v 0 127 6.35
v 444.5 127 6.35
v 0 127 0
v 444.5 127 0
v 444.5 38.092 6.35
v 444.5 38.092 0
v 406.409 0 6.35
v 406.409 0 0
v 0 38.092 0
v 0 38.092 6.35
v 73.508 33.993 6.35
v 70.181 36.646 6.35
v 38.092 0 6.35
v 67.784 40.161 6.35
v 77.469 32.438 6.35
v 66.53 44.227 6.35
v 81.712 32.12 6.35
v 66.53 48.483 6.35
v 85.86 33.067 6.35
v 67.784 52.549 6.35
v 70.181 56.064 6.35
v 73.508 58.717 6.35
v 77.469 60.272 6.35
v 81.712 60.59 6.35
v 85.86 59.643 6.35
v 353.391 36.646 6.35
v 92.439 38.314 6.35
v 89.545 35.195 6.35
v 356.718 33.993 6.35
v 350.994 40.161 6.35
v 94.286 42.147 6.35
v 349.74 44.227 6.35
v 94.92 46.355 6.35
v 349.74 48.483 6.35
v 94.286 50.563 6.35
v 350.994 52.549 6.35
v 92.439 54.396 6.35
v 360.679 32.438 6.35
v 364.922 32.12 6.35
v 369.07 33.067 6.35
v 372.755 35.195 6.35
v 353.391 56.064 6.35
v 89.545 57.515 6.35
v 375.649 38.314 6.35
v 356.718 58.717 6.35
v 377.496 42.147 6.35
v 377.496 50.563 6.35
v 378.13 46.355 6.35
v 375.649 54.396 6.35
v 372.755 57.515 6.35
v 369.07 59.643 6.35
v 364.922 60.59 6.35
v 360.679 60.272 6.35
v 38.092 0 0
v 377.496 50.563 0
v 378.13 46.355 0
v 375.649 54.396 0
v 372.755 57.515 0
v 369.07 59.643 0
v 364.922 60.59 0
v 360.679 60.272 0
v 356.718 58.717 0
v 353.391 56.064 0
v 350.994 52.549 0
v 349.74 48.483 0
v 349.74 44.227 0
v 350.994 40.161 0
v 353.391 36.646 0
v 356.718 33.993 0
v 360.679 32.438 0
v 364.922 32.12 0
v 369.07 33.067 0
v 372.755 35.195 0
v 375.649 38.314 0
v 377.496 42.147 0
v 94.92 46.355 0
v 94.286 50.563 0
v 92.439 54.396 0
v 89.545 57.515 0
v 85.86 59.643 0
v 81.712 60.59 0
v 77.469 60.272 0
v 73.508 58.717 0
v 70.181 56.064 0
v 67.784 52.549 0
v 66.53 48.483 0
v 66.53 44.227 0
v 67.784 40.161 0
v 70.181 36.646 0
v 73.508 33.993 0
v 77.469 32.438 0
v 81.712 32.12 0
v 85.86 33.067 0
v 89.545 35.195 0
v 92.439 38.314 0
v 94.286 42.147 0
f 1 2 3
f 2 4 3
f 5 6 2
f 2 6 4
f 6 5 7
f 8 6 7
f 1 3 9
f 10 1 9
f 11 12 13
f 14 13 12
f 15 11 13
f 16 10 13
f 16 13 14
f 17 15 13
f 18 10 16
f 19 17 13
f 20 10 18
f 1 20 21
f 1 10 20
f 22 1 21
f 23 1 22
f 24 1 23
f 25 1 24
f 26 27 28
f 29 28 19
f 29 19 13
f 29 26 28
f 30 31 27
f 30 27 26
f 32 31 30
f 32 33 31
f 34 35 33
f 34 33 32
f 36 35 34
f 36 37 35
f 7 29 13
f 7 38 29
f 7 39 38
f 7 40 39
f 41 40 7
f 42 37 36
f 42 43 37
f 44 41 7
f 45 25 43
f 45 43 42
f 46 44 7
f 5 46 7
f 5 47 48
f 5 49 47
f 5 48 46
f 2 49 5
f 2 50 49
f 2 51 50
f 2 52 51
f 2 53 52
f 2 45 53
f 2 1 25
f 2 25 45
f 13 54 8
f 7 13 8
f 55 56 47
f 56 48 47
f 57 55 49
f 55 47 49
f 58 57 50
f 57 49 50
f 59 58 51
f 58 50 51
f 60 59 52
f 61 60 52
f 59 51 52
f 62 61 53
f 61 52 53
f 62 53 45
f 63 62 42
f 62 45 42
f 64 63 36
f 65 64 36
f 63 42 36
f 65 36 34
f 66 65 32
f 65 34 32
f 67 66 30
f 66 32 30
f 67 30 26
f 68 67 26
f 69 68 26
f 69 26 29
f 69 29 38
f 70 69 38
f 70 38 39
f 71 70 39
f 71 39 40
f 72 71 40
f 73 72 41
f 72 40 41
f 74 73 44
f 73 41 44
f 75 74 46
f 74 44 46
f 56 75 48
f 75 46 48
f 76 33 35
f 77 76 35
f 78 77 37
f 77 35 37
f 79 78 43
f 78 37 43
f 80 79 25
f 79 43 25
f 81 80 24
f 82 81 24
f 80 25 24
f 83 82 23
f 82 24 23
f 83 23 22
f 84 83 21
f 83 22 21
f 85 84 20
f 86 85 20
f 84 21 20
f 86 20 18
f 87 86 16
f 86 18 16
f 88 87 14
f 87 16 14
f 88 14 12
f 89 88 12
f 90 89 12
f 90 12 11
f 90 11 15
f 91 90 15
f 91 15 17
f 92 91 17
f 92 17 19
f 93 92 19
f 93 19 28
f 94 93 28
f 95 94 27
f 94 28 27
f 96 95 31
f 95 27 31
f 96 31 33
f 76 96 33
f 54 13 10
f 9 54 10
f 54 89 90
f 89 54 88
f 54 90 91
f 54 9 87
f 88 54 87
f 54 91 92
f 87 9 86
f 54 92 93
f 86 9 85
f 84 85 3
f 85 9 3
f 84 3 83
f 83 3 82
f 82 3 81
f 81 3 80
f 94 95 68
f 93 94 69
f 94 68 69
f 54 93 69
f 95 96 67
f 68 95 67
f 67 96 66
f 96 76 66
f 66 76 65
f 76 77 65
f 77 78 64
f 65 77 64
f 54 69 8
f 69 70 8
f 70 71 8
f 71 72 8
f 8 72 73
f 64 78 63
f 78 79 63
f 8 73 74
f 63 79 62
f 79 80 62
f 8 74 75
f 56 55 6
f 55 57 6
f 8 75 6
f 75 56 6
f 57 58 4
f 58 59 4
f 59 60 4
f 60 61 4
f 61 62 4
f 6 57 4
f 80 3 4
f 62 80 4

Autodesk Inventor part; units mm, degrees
ref_plane "YZ Plane" through (0, 0, 0) normal (1, 0, 0) x (0, 1, 0)
ref_plane "XZ Plane" through (0, 0, 0) normal (0, 1, 0) x (-1, 0, 0)
ref_plane "XY Plane" through (0, 0, 0) normal (0, 0, 1) x (1, 0, 0)
sketch "Sketch1" plane through (0, 0, 0) normal (0, 0, 1) x (1, 0, 0)
  line L0 (0, 0) -> (444.5, 0)
  line L1 (444.5, 0) -> (444.5, 127)
  line L2 (444.5, 127) -> (0, 127)
  line L3 (0, 127) -> (0, 0)
  dimension "d0" = 444.5
  dimension "d1" = 127
extrude "Extrusion1" add sketch "Sketch1" along normal blind 6.35
sketch "Sketch2" plane through (0, 0, 6.35) normal (0, 0, 1) x (1, 0, 0)
  line L0 (0, 0) -> (444.5, 0) projected
  line L1 (38.0923, 0) -> (0, 38.0919)
  line L2 (0, 127) -> (0, 0) projected
  line L3 (0, 0) -> (444.5, 0) projected
  line L4 (444.5, 0) -> (444.5, 127) projected
  line L5 (444.5, 0) -> (406.4, 0)
  line L6 (444.5, 0) -> (482.6, 0) construction
  line L7 (444.5, 0) -> (444.5, 38.0919)
  line L8 (444.5, 38.0919) -> (406.4086, 0)
  point P0 (419.1126, 0)
  dimension "d19" = 38.1
  dimension "d20" = 180
extrude "Extrusion2" cut sketch "Sketch2" against normal blind 50.8
sketch "Sketch3" plane through (0, 0, 6.35) normal (0, 0, 1) x (1, 0, 0)
  line L0 (0, 77.664) -> (80.645, 77.664) construction
  line L1 (444.5, 127) -> (0, 127) projected
  line L2 (80.645, 127) -> (161.29, 127) construction
  circle A0 centre (80.645, 46.355) radius 14.2748
  line L3 (444.5, 38.0919) -> (444.5, 127) projected
  line L4 (444.5, 77.664) -> (525.145, 77.664) construction
  line L5 (444.5, 38.0919) -> (444.5, 127) projected
  line L6 (444.5, 46.355) -> (525.145, 46.355) construction
  circle A1 centre (363.855, 46.355) radius 14.2748
  line L7 (444.5, 127) -> (0, 127) projected
  line L8 (0, 127) -> (0, 38.0919) projected
  circle A2 centre (182.245, 46.355) radius 21.59
  circle A3 centre (262.255, 46.355) radius 21.59
  point P0 (0, 0)
  dimension "d10" = 28.5496
  dimension "d18" = 28.5496
  dimension "d31" = 43.18
  dimension "d32" = 43.18
extrude "Extrusion3" cut sketch "Sketch3" against normal blind 50.8 contours A0 | A1
properties part number "MecanumDriveTrainPlate17-18"
